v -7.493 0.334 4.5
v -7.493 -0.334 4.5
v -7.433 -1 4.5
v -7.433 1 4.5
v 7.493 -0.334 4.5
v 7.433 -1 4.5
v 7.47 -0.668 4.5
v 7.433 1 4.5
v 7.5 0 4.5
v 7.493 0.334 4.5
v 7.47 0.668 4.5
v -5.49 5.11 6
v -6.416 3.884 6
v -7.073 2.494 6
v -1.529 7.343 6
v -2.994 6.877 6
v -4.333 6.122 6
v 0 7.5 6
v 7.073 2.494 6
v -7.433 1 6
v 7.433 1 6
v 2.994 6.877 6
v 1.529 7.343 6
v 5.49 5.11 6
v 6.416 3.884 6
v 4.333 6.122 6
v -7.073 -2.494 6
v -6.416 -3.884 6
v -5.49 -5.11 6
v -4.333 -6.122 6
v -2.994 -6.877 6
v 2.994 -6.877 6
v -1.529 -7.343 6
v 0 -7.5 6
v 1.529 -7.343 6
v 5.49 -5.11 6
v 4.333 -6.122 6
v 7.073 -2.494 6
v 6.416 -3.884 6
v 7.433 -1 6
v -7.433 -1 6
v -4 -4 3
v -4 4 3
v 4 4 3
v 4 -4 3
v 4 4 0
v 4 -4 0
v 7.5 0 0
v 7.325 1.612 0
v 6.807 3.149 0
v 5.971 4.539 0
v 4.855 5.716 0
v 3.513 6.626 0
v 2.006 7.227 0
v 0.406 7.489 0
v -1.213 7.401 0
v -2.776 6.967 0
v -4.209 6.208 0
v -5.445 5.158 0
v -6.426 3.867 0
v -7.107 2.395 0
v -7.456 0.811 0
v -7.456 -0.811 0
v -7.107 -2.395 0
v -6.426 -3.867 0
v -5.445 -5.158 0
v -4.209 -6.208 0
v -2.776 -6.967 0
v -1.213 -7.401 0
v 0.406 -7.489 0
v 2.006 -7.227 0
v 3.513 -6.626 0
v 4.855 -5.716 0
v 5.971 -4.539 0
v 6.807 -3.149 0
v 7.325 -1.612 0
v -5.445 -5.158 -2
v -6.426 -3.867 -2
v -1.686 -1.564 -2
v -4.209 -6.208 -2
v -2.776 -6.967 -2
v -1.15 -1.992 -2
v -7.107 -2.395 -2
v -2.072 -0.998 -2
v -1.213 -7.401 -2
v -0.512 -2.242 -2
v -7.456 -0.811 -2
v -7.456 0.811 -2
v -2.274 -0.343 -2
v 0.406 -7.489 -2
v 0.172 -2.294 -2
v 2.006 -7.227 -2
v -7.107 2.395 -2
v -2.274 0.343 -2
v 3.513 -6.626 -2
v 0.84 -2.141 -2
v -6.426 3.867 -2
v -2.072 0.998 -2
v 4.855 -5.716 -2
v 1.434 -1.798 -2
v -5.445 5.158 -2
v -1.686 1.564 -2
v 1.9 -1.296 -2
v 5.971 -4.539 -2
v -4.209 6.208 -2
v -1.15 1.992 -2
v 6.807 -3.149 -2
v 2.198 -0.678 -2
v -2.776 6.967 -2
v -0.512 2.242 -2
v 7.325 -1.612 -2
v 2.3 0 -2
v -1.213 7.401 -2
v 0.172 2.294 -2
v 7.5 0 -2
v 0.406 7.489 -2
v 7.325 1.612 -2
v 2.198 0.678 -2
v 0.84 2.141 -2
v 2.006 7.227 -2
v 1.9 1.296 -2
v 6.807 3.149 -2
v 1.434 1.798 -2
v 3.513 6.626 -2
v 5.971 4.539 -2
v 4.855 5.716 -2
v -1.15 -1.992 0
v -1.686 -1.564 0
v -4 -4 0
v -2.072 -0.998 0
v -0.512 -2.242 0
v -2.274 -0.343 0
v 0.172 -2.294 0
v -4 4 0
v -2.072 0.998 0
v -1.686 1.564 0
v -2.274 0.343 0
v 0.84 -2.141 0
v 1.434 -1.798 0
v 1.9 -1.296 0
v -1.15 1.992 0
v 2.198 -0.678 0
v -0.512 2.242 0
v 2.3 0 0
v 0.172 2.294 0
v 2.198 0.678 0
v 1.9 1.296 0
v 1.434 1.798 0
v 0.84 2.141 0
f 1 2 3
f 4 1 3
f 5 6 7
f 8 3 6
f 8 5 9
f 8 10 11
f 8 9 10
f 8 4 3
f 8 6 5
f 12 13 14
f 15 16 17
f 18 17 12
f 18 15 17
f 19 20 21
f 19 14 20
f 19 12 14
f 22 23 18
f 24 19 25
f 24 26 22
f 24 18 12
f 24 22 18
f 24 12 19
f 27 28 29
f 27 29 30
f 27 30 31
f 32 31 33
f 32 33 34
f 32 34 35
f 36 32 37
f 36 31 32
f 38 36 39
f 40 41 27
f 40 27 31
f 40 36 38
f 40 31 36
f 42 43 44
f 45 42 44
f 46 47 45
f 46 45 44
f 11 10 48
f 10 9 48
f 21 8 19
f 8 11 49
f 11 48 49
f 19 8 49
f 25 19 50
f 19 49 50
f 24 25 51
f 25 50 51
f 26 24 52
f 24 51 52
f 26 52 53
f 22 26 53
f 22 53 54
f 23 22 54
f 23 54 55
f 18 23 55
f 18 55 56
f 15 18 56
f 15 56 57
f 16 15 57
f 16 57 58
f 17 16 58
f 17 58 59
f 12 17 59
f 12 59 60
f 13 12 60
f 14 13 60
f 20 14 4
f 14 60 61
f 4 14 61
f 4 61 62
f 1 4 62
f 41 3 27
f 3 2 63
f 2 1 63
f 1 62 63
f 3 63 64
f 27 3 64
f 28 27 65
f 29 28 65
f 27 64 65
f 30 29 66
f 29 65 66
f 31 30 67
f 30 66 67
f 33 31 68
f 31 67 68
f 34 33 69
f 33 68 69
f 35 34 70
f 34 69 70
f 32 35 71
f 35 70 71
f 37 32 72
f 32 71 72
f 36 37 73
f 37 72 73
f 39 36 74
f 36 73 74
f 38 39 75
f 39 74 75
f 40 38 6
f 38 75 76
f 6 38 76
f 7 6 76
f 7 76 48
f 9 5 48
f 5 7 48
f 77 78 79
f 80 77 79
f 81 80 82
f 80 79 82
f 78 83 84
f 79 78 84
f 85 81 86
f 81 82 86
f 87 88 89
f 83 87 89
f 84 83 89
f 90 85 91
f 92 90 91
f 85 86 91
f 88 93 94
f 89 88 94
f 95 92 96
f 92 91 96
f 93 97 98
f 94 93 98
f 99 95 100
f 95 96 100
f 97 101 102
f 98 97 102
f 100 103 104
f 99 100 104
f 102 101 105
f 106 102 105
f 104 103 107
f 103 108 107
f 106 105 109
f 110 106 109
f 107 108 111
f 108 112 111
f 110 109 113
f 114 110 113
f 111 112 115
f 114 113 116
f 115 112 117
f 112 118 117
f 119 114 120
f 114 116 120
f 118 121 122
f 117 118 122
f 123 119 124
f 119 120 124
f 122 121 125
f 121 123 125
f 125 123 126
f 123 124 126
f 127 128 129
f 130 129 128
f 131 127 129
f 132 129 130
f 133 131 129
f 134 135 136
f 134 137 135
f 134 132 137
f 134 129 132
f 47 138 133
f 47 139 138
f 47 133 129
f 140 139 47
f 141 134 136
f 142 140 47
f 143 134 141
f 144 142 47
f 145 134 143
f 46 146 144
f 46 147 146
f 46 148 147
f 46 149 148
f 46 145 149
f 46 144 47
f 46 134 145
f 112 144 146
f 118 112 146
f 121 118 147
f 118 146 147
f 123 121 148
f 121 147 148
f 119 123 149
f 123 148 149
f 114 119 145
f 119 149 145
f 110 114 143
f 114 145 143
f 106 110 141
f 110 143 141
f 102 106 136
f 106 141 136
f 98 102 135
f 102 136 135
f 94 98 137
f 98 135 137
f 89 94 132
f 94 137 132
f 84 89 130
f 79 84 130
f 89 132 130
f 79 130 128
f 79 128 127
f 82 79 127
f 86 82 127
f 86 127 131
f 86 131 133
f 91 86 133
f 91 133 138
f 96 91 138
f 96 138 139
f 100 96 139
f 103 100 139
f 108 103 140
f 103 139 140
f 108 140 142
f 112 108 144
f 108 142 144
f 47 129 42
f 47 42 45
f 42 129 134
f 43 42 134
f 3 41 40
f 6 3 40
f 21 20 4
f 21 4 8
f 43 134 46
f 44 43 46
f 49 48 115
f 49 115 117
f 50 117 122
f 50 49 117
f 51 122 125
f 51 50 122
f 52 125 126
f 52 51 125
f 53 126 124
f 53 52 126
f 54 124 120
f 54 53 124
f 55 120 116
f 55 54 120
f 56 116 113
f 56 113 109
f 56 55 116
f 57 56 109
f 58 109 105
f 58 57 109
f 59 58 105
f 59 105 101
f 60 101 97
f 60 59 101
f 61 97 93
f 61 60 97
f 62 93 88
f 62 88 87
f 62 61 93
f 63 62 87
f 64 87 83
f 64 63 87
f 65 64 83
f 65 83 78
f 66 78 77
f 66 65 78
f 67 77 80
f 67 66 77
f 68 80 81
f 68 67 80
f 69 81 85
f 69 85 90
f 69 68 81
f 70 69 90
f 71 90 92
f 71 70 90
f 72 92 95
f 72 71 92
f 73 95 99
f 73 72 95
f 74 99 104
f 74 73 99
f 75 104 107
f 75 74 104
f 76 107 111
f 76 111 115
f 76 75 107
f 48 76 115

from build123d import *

# Parameters (mm, degrees)
SKETCH_R        = 7.5
SKETCH_R_2      = 2.3
PAD_DEPTH       = 2
SKETCH001_R     = 7.5
PAD001_DEPTH    = 6
SKETCH002_W     = 8
SKETCH002_H     = 8
POCKET_DEPTH    = 3
SKETCH003_W     = 26.953154
SKETCH003_H     = 2
POCKET001_DEPTH = 3.5


with BuildPart() as part:
    # Sketch → Pad (new body)
    with BuildSketch(Plane.XY):
        Circle(SKETCH_R)
        Circle(SKETCH_R_2, mode=Mode.SUBTRACT)
    extrude(amount=-PAD_DEPTH)

    # Sketch001 → Pad001 (join)
    with BuildSketch(Plane.XY):
        Circle(SKETCH001_R)
    extrude(amount=PAD001_DEPTH)

    # Sketch002 → Pocket (cut)
    with BuildSketch(Plane.XY):
        Rectangle(SKETCH002_W, SKETCH002_H)
    extrude(amount=POCKET_DEPTH, mode=Mode.SUBTRACT)

    # Sketch003 (on DatumPlane) → Pocket001 (cut, symmetric)
    with BuildSketch(Plane.XY.offset(8)):
        Rectangle(SKETCH003_W, SKETCH003_H)
    extrude(amount=POCKET001_DEPTH, both=True, mode=Mode.SUBTRACT)


solid = part.part
